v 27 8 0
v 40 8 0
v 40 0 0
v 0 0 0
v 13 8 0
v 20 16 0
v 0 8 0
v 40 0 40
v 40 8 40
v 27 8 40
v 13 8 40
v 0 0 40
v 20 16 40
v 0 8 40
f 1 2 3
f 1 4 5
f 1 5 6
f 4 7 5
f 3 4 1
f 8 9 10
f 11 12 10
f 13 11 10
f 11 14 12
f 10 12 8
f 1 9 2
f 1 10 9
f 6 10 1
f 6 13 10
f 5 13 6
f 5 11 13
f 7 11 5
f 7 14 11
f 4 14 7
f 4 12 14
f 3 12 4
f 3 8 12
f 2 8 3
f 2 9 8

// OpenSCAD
$fn = 32;

// ----------------------------------------------------------------------
// V guide rail: vrib, 40 mm wide
// ----------------------------------------------------------------------

// --- parameters (mm) ---
rail_w = 40;              // rail width, X
base_t = 8;               // base plate thickness
v_depth = 8;              // V feature depth / height
v_half_w = 7;             // half width of the V at the base face
plate_t = 40;             // rail length, Z (the extrusion height)
fit_tol = 0.1;            // declared fit tolerance (prompt contract)
free_tol = 0.5;           // declared free tolerance (prompt contract)

profile = [[0, 0], [40, 0], [40, 8], [27, 8], [20, 16], [13, 8], [0, 8]];  // primary outline, 7 points, counter clockwise

// --- the one profile operation ---
linear_extrude(height = plate_t) polygon(points = profile);
